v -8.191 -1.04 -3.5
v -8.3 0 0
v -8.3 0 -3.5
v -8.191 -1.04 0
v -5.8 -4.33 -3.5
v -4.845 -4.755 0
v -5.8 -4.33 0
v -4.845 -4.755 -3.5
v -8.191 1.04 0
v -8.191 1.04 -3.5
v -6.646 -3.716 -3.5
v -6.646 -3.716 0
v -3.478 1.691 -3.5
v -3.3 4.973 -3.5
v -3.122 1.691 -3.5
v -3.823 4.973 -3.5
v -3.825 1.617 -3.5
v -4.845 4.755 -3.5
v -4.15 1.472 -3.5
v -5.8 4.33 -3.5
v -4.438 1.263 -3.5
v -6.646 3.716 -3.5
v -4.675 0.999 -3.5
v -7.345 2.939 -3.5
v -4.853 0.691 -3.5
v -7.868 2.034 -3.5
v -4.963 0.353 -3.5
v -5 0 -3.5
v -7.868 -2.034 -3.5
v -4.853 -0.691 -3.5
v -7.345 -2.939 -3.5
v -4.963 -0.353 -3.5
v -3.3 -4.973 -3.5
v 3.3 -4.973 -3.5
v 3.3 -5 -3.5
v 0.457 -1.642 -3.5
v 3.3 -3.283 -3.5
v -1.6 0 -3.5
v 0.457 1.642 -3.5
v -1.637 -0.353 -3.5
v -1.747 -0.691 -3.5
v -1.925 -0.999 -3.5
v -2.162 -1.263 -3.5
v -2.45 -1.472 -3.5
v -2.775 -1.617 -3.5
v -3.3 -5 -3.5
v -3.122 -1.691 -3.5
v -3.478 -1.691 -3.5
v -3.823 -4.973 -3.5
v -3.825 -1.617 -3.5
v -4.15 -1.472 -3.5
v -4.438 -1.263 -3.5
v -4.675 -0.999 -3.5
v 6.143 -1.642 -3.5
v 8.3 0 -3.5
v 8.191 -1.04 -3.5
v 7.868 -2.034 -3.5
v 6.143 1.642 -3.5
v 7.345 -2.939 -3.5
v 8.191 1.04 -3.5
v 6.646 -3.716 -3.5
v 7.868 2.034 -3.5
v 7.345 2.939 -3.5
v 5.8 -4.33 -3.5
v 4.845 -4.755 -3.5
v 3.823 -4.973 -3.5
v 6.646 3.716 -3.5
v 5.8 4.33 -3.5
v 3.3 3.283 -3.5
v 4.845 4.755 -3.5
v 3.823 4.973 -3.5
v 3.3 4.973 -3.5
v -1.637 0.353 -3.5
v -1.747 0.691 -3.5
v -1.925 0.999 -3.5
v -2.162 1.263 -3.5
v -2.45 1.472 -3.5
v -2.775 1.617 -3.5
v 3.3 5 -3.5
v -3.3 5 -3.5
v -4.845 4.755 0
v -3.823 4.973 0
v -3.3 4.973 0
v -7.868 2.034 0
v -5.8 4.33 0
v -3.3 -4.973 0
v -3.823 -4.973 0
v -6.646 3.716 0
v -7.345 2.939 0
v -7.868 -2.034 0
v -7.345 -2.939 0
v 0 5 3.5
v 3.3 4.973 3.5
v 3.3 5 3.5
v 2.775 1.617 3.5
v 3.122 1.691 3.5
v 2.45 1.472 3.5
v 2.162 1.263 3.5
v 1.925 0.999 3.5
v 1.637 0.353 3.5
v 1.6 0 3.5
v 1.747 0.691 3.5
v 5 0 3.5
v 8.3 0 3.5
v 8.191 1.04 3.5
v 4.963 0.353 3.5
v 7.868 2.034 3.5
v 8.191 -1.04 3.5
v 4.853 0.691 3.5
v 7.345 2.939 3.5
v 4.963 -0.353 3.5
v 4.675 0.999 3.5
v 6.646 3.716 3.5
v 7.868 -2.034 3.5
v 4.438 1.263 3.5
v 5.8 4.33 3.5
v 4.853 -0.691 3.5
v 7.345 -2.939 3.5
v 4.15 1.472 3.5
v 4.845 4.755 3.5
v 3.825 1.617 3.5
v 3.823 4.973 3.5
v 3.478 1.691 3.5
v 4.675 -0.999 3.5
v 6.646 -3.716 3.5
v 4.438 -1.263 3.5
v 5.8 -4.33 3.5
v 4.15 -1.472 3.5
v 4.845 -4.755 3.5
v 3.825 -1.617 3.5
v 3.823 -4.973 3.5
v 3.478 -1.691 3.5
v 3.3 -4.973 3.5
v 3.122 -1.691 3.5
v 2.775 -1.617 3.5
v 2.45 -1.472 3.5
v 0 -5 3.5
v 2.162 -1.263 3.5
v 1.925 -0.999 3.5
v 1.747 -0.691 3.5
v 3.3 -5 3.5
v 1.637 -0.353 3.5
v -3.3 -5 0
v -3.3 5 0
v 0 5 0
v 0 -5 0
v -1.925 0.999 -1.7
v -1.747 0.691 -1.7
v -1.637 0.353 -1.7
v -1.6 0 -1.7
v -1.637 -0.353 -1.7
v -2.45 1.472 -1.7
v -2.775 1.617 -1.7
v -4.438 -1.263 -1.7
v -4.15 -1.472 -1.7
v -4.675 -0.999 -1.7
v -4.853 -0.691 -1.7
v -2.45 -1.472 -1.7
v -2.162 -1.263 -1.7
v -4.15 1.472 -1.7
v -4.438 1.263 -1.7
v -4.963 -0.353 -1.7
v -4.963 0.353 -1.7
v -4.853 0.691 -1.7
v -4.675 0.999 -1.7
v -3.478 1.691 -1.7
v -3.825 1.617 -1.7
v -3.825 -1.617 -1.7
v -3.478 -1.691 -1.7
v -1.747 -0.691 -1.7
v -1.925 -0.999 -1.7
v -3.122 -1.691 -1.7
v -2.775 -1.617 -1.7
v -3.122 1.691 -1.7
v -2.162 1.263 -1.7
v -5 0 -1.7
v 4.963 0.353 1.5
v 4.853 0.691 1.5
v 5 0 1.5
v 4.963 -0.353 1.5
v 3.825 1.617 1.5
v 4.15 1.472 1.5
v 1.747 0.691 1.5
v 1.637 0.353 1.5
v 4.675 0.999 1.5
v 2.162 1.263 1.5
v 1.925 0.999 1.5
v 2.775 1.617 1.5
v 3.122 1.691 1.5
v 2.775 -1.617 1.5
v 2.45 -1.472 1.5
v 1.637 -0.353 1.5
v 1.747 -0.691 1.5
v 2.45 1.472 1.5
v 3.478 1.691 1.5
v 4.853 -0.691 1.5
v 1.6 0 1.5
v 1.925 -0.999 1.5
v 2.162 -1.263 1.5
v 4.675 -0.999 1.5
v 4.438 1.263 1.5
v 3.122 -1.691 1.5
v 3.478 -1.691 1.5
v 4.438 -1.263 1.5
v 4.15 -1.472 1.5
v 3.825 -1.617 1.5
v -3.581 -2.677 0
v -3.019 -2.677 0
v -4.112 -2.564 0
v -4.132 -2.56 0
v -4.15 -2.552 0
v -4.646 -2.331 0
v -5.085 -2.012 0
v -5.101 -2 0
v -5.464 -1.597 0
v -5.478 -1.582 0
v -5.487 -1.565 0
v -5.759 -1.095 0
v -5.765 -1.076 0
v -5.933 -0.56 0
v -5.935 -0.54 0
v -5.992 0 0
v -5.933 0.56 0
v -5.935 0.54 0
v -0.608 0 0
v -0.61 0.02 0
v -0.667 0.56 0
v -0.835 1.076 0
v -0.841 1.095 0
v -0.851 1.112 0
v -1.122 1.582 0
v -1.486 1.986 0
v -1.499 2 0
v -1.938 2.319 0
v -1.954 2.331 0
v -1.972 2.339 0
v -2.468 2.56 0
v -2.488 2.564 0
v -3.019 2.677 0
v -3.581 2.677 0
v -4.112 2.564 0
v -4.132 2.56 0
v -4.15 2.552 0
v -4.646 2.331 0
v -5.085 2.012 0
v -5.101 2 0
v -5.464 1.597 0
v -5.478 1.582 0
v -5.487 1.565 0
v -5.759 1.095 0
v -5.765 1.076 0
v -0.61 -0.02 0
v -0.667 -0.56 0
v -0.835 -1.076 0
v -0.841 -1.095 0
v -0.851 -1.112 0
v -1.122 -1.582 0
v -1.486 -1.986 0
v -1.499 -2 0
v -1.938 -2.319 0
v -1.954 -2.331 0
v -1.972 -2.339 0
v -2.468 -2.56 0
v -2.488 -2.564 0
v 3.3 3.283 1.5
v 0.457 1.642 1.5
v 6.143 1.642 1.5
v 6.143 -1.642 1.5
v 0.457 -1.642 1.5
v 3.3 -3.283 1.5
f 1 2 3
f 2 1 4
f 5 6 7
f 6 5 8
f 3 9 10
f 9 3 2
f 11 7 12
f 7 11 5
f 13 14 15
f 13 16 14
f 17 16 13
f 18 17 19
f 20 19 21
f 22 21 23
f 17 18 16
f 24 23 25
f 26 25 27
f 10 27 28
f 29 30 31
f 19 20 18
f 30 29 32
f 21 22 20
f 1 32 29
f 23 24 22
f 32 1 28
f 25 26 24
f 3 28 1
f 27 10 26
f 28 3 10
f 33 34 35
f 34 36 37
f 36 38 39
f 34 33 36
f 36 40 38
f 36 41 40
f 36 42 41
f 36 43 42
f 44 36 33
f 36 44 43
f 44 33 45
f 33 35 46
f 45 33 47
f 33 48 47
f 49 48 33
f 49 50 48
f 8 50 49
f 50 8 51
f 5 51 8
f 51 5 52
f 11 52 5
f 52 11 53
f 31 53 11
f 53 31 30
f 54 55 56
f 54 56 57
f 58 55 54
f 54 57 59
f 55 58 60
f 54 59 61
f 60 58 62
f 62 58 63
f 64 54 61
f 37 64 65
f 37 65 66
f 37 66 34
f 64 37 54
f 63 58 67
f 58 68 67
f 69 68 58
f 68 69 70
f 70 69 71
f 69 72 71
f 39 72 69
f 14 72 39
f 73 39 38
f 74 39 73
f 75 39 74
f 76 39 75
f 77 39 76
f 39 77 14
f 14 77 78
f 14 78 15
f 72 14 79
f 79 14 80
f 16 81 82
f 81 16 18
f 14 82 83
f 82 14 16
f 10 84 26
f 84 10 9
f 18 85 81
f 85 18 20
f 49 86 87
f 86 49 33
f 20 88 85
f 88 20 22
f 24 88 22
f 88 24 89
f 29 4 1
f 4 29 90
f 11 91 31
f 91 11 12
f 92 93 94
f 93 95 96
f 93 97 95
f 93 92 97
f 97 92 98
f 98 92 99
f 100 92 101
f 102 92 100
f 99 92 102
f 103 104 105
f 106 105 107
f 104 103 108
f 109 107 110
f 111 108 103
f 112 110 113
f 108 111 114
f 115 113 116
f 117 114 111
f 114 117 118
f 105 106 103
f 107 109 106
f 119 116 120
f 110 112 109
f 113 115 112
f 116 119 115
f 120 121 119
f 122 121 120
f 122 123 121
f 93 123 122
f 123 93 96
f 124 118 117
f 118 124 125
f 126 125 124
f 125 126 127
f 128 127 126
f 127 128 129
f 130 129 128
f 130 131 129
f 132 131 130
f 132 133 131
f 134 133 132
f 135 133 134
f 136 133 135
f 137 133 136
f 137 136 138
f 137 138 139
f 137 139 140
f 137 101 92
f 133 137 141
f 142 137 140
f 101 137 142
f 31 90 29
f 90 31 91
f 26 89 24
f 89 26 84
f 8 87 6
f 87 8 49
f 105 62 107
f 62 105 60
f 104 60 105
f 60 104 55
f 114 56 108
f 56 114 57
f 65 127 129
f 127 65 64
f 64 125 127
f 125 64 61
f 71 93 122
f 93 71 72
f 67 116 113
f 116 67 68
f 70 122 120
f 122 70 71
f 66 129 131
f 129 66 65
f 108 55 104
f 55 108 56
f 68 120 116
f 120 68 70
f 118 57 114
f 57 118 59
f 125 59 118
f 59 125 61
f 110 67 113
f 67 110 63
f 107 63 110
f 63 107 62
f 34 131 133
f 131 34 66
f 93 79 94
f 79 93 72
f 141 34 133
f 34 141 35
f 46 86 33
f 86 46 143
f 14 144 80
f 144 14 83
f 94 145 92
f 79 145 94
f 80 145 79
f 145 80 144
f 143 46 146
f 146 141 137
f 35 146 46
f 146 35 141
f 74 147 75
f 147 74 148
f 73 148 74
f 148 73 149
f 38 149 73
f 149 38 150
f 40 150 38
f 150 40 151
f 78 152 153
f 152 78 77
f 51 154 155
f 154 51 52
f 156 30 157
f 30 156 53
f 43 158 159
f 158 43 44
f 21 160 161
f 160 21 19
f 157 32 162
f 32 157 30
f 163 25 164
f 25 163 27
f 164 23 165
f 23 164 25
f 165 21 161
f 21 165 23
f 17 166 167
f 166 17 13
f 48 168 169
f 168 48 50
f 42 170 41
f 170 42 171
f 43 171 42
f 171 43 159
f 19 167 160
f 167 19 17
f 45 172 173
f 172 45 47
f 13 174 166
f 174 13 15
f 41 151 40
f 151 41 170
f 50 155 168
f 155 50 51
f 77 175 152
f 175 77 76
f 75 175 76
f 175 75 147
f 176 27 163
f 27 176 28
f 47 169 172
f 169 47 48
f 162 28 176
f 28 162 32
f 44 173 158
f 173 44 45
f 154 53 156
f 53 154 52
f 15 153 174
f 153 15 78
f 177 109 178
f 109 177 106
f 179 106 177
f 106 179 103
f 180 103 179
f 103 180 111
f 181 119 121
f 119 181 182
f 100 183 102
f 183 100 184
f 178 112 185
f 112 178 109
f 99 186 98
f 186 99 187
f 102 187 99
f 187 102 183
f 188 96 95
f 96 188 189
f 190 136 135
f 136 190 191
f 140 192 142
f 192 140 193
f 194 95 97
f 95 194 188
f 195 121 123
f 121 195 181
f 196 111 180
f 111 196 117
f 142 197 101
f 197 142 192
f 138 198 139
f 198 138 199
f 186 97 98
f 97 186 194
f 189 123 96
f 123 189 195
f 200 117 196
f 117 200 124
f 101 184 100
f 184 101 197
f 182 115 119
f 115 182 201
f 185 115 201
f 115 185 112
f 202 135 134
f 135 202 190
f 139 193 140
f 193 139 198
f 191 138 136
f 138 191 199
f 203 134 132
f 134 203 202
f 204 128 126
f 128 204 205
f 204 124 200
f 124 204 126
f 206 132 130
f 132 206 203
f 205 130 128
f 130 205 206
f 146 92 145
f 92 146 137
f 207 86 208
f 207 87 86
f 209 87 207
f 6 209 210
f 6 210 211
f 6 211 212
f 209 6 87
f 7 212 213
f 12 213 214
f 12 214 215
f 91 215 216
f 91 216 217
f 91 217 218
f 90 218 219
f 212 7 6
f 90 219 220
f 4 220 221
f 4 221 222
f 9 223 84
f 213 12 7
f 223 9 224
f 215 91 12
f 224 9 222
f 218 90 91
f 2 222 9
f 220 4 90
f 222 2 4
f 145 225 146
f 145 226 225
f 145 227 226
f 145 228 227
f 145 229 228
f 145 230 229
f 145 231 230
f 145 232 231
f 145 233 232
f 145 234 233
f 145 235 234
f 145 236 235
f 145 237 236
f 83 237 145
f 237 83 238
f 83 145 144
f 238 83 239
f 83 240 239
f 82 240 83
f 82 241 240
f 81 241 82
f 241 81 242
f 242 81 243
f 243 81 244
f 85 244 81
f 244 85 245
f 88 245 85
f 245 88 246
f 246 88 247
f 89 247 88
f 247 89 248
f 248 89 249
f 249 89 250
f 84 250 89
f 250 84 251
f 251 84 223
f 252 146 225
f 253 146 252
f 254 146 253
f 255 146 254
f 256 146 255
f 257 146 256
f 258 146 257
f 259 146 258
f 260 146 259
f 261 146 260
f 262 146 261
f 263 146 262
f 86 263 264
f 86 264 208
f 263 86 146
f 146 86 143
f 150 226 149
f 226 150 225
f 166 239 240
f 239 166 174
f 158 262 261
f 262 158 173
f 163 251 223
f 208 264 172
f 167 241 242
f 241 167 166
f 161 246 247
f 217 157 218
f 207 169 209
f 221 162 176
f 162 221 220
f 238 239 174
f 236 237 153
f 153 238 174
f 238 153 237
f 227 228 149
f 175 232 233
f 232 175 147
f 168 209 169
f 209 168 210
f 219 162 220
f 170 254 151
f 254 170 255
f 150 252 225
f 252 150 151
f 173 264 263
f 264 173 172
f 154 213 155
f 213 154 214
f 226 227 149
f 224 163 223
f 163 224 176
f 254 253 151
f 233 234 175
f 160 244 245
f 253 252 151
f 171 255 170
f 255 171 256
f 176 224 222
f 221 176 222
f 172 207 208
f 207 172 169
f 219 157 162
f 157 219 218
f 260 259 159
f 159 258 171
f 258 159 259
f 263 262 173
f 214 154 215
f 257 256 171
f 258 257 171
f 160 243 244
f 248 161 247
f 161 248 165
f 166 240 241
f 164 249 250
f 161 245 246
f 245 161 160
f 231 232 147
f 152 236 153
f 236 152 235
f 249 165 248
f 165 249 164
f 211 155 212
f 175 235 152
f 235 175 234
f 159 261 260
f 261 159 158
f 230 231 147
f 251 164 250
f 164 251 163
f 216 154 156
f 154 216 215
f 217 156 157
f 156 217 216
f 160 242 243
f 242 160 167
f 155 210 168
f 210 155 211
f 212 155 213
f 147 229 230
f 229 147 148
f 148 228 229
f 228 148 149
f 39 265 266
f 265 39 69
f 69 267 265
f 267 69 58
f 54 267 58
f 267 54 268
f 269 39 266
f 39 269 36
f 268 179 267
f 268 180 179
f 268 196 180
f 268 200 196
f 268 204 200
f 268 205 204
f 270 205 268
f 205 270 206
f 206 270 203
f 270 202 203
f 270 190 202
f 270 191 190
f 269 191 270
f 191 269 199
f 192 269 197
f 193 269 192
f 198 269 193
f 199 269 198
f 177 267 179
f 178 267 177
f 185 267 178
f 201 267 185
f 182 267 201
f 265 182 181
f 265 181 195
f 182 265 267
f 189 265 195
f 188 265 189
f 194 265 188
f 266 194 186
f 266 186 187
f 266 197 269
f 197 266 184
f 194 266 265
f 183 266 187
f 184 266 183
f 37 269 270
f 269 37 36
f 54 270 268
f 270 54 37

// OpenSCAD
/*
  Allows a PCB to be mounted using holes not of the same pitch as the centres
	of its own holes.

	Adrian

	3 February 2014

*/

// Distance between holes.  (Duet needs 6.6, 11.1 and 13.5)

offset = 6.6;

// How far to separate the PCB from the surface under it

height = 7;

PCBOffsetClip();

module PCBOffsetClip()
{
	difference()
	{
		RoundEnd([offset,10,height]);
		for(x=[-1,1])
			translate([x*offset/2,0,0])
				cylinder(r=1.7, h = height*2, center=true, $fn=30);
		translate([-offset,0,height/2])
			cube([2*offset, 11, height], center=true);
		translate([-offset/2,0,-0.8])
 			cylinder(r2 = 5.5/2, r1=1.7, h = 1.8, 
				center=true, $fn=30);
		translate([offset/2,0,-2])
			rotate([0,0,30])
 			cylinder(r = 5.6 / 2 / cos(180 / 6) + 0.05, h = height, 
				center=true, $fn=6);
 
	}
}

module RoundEnd(b = [10,5,5])
{
	union()
	{
		cube(b, center=true);
		for(x=[-1,1])
		translate([x*b.x/2,0,0])
			cylinder(r=b.y/2, h=b.z, center=true, $fn=30);
	}
}
